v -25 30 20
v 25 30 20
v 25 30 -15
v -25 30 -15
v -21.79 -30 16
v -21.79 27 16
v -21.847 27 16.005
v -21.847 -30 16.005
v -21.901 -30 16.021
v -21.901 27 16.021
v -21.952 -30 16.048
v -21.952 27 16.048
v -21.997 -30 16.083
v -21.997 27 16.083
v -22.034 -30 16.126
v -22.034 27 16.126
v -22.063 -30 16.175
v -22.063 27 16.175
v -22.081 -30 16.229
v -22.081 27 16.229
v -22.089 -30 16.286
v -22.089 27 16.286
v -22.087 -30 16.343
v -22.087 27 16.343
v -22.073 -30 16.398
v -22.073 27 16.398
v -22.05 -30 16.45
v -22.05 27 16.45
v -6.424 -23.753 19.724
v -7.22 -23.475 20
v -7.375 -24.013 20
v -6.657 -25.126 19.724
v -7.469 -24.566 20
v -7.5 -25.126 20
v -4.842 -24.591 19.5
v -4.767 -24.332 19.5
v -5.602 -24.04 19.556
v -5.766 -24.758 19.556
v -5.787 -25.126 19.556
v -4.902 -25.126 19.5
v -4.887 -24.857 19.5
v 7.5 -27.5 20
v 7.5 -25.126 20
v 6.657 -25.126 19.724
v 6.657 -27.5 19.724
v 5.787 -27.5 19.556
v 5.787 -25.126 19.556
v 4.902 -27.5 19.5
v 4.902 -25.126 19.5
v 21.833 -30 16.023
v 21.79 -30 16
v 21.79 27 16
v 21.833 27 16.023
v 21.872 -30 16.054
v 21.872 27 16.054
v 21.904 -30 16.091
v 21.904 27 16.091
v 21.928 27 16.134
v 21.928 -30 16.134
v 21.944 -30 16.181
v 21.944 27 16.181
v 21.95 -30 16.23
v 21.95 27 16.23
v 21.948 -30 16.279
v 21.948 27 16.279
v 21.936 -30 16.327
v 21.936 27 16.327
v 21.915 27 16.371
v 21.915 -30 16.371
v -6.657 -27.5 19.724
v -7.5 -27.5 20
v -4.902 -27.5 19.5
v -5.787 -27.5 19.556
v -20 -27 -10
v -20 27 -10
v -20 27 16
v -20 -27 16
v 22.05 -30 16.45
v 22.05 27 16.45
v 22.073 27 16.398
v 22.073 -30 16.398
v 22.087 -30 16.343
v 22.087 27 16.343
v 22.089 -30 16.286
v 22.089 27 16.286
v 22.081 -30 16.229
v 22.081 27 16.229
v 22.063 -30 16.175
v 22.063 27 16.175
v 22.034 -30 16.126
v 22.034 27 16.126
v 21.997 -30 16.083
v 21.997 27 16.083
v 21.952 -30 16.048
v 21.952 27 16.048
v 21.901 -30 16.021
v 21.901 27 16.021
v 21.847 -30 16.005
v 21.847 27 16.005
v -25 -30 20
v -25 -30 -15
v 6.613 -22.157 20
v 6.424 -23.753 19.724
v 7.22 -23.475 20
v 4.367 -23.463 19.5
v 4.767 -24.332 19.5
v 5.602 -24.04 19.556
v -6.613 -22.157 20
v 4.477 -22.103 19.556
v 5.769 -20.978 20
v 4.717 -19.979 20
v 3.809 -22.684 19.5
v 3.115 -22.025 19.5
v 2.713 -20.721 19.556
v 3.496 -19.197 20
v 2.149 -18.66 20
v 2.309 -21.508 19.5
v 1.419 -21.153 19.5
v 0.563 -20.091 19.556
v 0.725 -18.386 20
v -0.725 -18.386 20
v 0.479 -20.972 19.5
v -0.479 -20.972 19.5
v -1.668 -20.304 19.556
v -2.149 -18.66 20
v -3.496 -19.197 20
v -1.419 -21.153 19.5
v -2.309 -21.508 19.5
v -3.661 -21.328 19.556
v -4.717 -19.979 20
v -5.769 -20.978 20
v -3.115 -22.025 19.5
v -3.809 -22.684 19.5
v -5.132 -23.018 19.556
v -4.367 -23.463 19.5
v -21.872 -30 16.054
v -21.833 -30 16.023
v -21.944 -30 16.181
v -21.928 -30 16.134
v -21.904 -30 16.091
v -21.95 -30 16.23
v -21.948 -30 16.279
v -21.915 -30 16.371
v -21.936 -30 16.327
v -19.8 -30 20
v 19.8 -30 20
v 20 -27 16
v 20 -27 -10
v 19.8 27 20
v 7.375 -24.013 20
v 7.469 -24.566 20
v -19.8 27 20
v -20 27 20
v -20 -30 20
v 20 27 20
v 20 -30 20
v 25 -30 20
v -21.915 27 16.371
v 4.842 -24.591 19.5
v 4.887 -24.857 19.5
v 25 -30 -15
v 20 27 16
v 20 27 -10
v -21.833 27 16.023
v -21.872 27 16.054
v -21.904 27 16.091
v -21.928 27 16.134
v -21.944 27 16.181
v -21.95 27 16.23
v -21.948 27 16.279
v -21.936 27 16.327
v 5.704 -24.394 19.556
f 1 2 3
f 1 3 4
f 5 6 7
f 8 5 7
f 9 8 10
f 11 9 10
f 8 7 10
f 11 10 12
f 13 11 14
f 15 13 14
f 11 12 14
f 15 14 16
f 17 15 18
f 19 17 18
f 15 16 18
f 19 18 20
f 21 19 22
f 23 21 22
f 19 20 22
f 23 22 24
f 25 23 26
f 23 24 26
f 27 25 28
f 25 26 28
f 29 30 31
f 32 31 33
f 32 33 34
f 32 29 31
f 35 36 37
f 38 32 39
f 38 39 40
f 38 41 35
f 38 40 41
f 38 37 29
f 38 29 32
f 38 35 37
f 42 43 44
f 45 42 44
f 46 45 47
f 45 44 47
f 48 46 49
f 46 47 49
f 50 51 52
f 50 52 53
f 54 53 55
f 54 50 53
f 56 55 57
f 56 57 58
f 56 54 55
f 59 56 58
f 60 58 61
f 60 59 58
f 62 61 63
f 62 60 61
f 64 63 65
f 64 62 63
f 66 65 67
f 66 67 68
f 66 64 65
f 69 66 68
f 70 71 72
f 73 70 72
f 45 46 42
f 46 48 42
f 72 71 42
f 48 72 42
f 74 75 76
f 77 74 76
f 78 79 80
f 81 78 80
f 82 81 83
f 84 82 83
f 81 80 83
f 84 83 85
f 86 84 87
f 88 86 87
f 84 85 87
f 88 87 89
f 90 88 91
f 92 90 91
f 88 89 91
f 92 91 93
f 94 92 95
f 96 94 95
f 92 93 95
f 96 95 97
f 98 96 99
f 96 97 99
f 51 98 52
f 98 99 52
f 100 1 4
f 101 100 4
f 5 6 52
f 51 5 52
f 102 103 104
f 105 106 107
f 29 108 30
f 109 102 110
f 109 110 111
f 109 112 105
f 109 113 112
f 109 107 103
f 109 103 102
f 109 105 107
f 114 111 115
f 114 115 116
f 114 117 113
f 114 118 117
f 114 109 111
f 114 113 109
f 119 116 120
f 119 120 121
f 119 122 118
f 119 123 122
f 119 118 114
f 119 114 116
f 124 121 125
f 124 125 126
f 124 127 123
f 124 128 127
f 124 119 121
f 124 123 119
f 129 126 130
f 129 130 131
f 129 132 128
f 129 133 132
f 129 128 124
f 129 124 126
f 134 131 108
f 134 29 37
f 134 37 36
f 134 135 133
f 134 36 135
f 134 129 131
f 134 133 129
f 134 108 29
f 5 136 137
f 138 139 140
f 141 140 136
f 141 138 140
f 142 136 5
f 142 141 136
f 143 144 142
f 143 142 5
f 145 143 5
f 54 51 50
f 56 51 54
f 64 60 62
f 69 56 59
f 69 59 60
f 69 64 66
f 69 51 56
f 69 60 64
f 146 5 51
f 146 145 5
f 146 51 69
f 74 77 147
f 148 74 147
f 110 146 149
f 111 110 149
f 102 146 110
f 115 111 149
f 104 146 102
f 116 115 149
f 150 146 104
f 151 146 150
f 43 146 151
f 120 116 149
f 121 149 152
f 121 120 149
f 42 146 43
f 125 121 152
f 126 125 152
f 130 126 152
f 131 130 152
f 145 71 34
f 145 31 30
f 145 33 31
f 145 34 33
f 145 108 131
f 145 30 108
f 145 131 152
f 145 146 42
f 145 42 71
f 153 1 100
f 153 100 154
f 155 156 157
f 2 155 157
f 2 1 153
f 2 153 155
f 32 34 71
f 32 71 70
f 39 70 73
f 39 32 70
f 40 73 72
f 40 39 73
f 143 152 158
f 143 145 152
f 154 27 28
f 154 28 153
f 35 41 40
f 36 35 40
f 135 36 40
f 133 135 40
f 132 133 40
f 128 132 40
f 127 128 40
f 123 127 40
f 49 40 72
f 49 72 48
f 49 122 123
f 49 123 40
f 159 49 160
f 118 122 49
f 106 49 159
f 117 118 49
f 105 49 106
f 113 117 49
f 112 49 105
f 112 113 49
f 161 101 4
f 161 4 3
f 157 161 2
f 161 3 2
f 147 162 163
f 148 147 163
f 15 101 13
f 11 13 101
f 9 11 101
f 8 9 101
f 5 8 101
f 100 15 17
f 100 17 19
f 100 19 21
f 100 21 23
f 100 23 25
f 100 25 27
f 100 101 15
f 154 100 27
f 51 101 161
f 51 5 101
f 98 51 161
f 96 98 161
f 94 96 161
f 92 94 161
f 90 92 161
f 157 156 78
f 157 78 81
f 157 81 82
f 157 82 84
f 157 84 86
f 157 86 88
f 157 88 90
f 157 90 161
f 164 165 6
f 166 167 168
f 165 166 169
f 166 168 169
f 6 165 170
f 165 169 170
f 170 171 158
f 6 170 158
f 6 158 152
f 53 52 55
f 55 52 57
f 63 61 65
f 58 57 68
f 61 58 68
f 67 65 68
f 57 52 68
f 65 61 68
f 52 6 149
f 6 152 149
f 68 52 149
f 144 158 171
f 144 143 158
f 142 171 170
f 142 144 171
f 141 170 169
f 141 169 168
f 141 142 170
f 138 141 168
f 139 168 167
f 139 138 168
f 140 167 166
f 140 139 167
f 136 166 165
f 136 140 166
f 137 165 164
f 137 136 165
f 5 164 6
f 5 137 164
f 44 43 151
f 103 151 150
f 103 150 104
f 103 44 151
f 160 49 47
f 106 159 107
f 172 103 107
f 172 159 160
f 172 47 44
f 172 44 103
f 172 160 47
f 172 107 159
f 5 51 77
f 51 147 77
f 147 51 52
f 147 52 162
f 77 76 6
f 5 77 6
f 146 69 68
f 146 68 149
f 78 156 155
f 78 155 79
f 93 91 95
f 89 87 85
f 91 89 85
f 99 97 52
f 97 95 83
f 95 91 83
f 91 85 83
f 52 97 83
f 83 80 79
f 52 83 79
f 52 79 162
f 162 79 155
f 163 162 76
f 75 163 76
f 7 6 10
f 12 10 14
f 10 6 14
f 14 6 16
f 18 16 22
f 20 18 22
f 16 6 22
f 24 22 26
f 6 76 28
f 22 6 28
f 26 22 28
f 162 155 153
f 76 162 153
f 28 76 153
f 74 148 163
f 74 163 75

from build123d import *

# Parameters (mm, degrees)
F1_DEPTH      = 30
F1_DEPTH_BACK = 30
F2_W          = 40
F2_H          = 26
F3_DEPTH      = 3
F5_DEPTH      = 3
F6_DEPTH      = 30
F6_DEPTH_BACK = 27
F8_DEPTH      = 0.5
F9_T1_DEPTH   = 2.3744754405
F9_T4_ANGLE   = 141.4413290381
F9_T6_ANGLE   = 19.2793354809
F9_T8_ANGLE   = 19.2793354809


# Not quite as in the source:
# - a fillet or chamfer that OpenCascade refuses, or shapes differently, is made with other operations: its cross-section is extruded or revolved along the edge and cut away or added


with BuildPart() as f1:
    # F0 (on Front) → F1 (new body, two sides)
    with BuildSketch(Plane.XZ) as f1_sk:
        with BuildLine():
            Line((-25, -15), (0, -15))
            Line((0, -15), (0, -10))
            Line((0, -10), (-20, -10))
            Line((-20, -10), (-20, 15.9987840325))
            Line((-20, 15.9987840325), (-20, 16))
            Line((-20, 16), (-21.7897858345, 16))
            ThreePointArc((-21.7897858345, 16), (-22.0495934556, 16.15), (-22.0495934556, 16.45))
            Line((-22.0495934556, 16.45), (-20, 20))
            Line((-20, 20), (-25, 20))
            Line((-25, 20), (-25, -15))
        make_face()
        with BuildLine():
            Line((0, -10), (0, -15))
            Line((0, -15), (25, -15))
            Line((25, -15), (25, 20))
            Line((25, 20), (20, 20))
            Line((20, 20), (22.0495934556, 16.45))
            ThreePointArc((22.0495934556, 16.45), (22.0495934556, 16.15), (21.7897858345, 16))
            Line((21.7897858345, 16), (20, 16))
            Line((20, 16), (20, 15.9987840325))
            Line((20, 15.9987840325), (20, -10))
            Line((20, -10), (0, -10))
        make_face()
    extrude(amount=-F1_DEPTH)
    extrude(f1_sk.sketch, amount=F1_DEPTH_BACK)

    # F2 (on face) → F3 (join)
    with BuildSketch(Plane.XZ.offset(30)):
        with Locations((0, 3)):
            Rectangle(F2_W, F2_H)
        Polygon((-21.7897858345, 16), (-25, 16), (-25, -15), (25, -15), (25, 16), (21.7897858345, 16), (20, 16), (20, -10), (-20, -10), (-20, 16), align=None)
    extrude(amount=-F3_DEPTH)

    # F4 (on face) → F5 (join)
    with BuildSketch(Plane(origin=(0, 30, 0), x_dir=(-1, 0, 0), z_dir=(0, 1, 0))):
        with BuildLine():
            Line((20, 20), (-20, 20))
            Line((-20, 20), (-22.0495934556, 16.45))
            ThreePointArc((-22.0495934556, 16.45), (-22.0495934556, 16.15), (-21.7897858345, 16))
            Line((-21.7897858345, 16), (-20, 16))
            Line((-20, 16), (-20, -10))
            Line((-20, -10), (20, -10))
            Line((20, -10), (20, 16))
            Line((20, 16), (21.7897858345, 16))
            ThreePointArc((21.7897858345, 16), (22.0495934556, 16.15), (22.0495934556, 16.45))
            Line((22.0495934556, 16.45), (20, 20))
        make_face()
    extrude(amount=-F5_DEPTH)


with BuildPart() as f6:
    # F0 (on Front) → F6 (new body, two sides)
    with BuildSketch(Plane.XZ) as f6_sk:
        with BuildLine():
            Line((-21.7897858345, 16), (-20, 16))
            Line((-20, 16), (0, 16))
            Line((0, 16), (20, 16))
            Line((20, 16), (21.7897858345, 16))
            ThreePointArc((21.7897858345, 16), (21.9370082159, 16.1571086836), (21.9153242604, 16.3713220681))
            Line((21.9153242604, 16.3713220681), (19.8, 20))
            Line((19.8, 20), (0, 20))
            Line((0, 20), (-19.8, 20))
            Line((-19.8, 20), (-21.9153242604, 16.3713220681))
            ThreePointArc((-21.9153242604, 16.3713220681), (-21.9370082159, 16.1571086836), (-21.7897858345, 16))
        make_face()
    extrude(amount=F6_DEPTH)
    extrude(f6_sk.sketch, amount=-F6_DEPTH_BACK)

    # F7 (on face) → F8 (cut)
    with BuildSketch(Plane.XY.offset(20)):
        with BuildLine():
            Line((-7.5, -27.5), (7.5, -27.5))
            Line((7.5, -27.5), (7.5, -25.1255245595))
            ThreePointArc((7.5, -25.1255245595), (7.4294017066, -24.2882678396), (7.219600474, -23.474654678))
            ThreePointArc((7.219600474, -23.474654678), (0, -18.3514707296), (-7.219600474, -23.474654678))
            ThreePointArc((-7.219600474, -23.474654678), (-7.4294017066, -24.2882678396), (-7.5, -25.1255245595))
            Line((-7.5, -25.1255245595), (-7.5, -27.5))
        make_face()
    extrude(amount=-F8_DEPTH, mode=Mode.SUBTRACT)

    # F9: fillet of radius 7 on 1 edges, made by hand

    # F9_s2 → F9_t1 (join)
    with BuildSketch(Plane.XZ.offset(25.1255245595)):
        with BuildLine():
            ThreePointArc((-7.5, 20), (-6.2247994442, 19.6261364576), (-4.9019237886, 19.5))
            Line((-4.9019237886, 19.5), (-7.5, 19.5))
            Line((-7.5, 19.5), (-7.5, 20))
        make_face()
        with BuildLine():
            ThreePointArc((7.5, 20), (6.2247994442, 19.6261364576), (4.9019237886, 19.5))
            Line((4.9019237886, 19.5), (7.5, 19.5))
            Line((7.5, 19.5), (7.5, 20))
        make_face()
    extrude(amount=F9_T1_DEPTH)

    # F9_s3 → F9_t4 (revolve)
    with BuildSketch(Plane(origin=(8.1031041262, -23.1656137798, 0), x_dir=(0, 0, 1), z_dir=(0.3301739763, -0.9439200948, 0))):
        with BuildLine():
            ThreePointArc((20, 0.9359941133), (19.6261364576, 2.2111946691), (19.5, 3.5340703247))
            Line((19.5, 3.5340703247), (19.5, 0.9359941133))
            Line((19.5, 0.9359941133), (20, 0.9359941133))
        make_face()
    revolve(axis=Axis((0, -26, 19.5), (0, 0, 1)), revolution_arc=F9_T4_ANGLE)

    # F9_s5 → F9_t6 (revolve)
    with BuildSketch(Plane.XZ.offset(25.1255245595)):
        with BuildLine():
            ThreePointArc((7.5, 20), (6.2247994442, 19.6261364576), (4.9019237886, 19.5))
            Line((4.9019237886, 19.5), (7.5, 19.5))
            Line((7.5, 19.5), (7.5, 20))
        make_face()
    revolve(axis=Axis((2.5, -25.1255245595, 19.5), (0, 0, 1)), revolution_arc=F9_T6_ANGLE)

    # F9_s7 → F9_t8 (revolve)
    with BuildSketch(Plane(origin=(-8.1031041262, -23.1656137798, 0), x_dir=(0, 0, 1), z_dir=(0.3301739763, 0.9439200948, 0))):
        with BuildLine():
            ThreePointArc((20, 0.9359941133), (19.6261364576, 2.2111946691), (19.5, 3.5340703247))
            Line((19.5, 3.5340703247), (19.5, 0.9359941133))
            Line((19.5, 0.9359941133), (20, 0.9359941133))
        make_face()
    revolve(axis=Axis((-2.5, -25.1255245595, 19.5), (0, 0, 1)), revolution_arc=F9_T8_ANGLE)


solid = Compound([f1.part, f6.part])
